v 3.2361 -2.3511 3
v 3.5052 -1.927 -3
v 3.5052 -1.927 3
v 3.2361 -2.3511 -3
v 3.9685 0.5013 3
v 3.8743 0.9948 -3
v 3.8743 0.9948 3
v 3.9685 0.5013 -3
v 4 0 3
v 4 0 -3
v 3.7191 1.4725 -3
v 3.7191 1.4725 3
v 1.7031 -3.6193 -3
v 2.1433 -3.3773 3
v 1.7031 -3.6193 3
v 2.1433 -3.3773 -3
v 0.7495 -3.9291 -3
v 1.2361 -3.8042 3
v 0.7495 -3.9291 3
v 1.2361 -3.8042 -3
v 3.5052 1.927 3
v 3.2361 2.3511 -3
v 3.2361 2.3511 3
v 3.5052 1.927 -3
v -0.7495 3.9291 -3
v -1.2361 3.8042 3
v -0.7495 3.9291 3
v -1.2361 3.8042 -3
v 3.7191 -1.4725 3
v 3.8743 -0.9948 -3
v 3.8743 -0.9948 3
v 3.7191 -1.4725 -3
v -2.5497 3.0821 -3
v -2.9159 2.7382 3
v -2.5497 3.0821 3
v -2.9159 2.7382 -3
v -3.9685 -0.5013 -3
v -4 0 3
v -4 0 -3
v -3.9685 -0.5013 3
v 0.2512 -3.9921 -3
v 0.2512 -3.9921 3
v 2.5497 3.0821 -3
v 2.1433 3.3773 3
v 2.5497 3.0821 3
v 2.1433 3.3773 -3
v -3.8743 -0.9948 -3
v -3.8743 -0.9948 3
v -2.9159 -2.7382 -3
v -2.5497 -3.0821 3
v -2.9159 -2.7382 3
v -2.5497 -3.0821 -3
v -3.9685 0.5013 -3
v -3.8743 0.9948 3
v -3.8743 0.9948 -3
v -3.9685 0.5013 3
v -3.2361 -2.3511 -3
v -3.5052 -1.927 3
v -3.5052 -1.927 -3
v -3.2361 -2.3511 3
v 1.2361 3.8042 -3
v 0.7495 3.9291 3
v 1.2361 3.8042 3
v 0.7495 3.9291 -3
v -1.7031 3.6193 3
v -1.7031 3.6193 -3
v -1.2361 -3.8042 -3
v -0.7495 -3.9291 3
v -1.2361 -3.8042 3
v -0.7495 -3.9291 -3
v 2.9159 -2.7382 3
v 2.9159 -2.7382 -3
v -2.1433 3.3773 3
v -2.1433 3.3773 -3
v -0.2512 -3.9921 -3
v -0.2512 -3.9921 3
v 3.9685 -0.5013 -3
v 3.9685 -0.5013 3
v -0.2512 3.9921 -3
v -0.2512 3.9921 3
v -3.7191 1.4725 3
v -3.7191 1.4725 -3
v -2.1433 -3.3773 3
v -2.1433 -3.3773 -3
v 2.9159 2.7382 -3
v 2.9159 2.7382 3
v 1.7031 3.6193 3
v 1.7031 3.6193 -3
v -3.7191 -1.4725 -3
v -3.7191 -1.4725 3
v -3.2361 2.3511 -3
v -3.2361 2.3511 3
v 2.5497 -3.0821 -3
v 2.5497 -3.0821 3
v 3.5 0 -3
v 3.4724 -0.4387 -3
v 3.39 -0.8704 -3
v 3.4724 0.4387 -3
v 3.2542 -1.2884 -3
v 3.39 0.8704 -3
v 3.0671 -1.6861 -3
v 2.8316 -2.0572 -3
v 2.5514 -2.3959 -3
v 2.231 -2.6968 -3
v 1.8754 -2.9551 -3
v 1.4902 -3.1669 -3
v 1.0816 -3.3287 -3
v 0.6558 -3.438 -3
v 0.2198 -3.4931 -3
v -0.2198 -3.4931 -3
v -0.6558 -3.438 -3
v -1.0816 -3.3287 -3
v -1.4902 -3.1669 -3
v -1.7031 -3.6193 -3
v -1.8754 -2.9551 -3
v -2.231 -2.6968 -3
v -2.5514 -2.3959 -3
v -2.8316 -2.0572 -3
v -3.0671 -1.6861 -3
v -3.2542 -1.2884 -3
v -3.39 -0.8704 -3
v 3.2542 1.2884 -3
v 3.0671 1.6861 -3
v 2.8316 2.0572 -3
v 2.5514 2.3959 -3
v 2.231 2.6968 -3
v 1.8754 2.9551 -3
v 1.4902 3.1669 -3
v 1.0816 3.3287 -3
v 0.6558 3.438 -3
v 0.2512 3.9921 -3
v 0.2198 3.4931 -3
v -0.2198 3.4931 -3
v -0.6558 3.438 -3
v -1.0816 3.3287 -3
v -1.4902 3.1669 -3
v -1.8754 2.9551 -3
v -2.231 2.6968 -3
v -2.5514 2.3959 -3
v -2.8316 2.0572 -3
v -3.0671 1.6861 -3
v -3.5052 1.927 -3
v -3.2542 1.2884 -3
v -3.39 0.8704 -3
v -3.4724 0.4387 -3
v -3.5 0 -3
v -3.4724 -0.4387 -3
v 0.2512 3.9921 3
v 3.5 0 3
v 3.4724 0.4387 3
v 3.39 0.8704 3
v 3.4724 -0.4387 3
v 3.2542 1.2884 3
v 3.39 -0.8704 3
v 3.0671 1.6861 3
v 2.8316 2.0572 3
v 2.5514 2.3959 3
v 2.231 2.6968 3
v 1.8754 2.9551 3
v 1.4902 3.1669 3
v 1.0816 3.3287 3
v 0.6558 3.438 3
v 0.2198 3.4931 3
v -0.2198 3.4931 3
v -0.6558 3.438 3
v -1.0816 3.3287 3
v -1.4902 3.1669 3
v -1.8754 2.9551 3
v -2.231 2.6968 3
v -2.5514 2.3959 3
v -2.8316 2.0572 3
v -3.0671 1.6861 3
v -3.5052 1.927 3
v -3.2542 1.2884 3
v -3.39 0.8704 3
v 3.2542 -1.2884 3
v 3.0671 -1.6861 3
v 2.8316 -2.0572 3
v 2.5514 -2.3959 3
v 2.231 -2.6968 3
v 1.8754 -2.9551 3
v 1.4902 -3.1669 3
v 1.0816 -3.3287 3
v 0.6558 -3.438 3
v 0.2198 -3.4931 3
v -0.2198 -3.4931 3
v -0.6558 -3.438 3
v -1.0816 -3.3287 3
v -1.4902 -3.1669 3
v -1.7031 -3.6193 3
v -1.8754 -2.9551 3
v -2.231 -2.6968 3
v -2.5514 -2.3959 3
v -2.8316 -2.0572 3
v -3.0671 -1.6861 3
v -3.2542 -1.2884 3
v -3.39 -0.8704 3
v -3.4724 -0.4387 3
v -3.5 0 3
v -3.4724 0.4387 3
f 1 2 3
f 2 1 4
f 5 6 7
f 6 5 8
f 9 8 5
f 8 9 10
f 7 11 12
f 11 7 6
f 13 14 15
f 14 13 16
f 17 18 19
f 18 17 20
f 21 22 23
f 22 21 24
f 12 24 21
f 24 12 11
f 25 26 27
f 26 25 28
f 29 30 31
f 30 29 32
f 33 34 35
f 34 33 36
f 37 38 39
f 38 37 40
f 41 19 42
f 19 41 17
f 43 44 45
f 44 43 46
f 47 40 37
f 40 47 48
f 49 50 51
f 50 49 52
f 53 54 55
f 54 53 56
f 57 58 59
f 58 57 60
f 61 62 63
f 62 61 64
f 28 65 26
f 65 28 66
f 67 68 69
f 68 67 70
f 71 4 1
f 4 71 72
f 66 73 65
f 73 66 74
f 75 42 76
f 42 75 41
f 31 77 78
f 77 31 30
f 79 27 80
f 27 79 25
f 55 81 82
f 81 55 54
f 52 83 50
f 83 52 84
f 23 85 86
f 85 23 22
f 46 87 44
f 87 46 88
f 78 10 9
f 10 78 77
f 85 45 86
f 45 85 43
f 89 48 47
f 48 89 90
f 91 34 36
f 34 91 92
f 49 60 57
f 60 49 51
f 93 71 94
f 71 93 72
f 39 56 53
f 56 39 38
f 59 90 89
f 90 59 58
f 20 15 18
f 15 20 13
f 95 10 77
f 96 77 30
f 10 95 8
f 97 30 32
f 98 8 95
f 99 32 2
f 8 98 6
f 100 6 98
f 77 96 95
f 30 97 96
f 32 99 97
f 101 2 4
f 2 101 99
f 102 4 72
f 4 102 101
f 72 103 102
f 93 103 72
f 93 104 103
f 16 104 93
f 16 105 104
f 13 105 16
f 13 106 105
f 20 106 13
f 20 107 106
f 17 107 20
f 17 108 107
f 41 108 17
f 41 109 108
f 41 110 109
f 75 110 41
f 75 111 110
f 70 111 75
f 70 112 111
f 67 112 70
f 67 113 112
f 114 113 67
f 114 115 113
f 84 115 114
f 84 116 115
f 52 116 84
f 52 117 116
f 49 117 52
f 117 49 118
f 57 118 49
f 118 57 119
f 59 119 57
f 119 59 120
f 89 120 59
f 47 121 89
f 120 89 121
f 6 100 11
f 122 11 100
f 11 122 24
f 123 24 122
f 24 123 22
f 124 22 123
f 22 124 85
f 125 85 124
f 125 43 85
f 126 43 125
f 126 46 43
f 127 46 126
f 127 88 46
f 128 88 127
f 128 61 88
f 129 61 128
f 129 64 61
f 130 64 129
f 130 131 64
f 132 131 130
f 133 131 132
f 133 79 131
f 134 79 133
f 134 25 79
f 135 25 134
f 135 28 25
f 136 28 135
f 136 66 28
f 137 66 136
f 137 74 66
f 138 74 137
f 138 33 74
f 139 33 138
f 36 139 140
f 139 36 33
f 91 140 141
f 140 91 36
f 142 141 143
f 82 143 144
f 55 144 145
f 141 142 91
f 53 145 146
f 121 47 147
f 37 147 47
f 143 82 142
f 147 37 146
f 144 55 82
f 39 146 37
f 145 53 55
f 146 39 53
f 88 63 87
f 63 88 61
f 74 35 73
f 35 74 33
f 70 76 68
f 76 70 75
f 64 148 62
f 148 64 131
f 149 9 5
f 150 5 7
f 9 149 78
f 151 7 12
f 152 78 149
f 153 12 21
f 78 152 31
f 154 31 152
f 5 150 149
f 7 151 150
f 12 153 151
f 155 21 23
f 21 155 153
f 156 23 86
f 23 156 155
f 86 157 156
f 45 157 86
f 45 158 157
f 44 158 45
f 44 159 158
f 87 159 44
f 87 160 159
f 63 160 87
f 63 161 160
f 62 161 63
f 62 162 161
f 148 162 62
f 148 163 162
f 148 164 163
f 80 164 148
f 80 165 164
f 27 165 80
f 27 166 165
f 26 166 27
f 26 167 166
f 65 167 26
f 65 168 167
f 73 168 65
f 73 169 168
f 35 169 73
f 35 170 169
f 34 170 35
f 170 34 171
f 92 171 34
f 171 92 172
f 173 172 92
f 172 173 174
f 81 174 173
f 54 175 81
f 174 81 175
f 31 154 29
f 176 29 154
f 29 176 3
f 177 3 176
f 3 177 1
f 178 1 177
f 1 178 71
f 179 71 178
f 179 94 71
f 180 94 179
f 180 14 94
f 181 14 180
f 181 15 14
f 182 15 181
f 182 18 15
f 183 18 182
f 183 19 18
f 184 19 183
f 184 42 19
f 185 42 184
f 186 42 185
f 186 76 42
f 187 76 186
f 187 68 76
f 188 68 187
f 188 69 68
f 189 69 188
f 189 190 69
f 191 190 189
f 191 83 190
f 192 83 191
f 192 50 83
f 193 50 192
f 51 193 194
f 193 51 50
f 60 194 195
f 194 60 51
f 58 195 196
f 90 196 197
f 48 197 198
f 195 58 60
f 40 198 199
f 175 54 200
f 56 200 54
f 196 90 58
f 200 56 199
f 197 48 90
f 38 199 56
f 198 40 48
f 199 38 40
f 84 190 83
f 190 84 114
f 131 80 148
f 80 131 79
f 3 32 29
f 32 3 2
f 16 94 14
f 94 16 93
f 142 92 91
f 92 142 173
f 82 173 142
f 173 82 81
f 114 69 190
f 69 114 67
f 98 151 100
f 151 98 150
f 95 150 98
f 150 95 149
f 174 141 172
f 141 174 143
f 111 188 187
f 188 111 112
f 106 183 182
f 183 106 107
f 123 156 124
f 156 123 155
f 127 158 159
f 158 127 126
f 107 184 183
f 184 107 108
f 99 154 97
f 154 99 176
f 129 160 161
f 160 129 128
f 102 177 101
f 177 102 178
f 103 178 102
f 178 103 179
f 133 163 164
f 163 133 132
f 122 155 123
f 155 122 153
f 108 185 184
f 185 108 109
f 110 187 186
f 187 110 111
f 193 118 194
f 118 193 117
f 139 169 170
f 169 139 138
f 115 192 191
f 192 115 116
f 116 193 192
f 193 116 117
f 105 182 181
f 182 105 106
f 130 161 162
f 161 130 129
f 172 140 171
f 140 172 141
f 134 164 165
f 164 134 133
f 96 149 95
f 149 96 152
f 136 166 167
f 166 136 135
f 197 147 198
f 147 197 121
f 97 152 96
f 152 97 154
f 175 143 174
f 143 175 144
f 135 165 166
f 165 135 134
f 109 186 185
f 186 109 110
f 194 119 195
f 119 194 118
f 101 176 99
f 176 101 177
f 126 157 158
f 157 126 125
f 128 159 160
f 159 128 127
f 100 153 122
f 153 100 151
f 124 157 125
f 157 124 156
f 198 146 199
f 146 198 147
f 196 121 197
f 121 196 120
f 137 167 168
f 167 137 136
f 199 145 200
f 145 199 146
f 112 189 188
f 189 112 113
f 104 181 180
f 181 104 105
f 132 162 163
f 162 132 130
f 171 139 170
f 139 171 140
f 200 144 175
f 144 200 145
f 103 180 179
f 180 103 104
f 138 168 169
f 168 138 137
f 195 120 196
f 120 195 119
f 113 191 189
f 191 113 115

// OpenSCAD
$fn = 50;


difference() {
	union() {
		translate(v = [0, 0, -3.0000000000]) {
			cylinder(h = 6, r = 4.0000000000);
		}
	}
	union() {
		translate(v = [0, 0, -100.0000000000]) {
			cylinder(h = 200, r = 3.5000000000);
		}
	}
}
